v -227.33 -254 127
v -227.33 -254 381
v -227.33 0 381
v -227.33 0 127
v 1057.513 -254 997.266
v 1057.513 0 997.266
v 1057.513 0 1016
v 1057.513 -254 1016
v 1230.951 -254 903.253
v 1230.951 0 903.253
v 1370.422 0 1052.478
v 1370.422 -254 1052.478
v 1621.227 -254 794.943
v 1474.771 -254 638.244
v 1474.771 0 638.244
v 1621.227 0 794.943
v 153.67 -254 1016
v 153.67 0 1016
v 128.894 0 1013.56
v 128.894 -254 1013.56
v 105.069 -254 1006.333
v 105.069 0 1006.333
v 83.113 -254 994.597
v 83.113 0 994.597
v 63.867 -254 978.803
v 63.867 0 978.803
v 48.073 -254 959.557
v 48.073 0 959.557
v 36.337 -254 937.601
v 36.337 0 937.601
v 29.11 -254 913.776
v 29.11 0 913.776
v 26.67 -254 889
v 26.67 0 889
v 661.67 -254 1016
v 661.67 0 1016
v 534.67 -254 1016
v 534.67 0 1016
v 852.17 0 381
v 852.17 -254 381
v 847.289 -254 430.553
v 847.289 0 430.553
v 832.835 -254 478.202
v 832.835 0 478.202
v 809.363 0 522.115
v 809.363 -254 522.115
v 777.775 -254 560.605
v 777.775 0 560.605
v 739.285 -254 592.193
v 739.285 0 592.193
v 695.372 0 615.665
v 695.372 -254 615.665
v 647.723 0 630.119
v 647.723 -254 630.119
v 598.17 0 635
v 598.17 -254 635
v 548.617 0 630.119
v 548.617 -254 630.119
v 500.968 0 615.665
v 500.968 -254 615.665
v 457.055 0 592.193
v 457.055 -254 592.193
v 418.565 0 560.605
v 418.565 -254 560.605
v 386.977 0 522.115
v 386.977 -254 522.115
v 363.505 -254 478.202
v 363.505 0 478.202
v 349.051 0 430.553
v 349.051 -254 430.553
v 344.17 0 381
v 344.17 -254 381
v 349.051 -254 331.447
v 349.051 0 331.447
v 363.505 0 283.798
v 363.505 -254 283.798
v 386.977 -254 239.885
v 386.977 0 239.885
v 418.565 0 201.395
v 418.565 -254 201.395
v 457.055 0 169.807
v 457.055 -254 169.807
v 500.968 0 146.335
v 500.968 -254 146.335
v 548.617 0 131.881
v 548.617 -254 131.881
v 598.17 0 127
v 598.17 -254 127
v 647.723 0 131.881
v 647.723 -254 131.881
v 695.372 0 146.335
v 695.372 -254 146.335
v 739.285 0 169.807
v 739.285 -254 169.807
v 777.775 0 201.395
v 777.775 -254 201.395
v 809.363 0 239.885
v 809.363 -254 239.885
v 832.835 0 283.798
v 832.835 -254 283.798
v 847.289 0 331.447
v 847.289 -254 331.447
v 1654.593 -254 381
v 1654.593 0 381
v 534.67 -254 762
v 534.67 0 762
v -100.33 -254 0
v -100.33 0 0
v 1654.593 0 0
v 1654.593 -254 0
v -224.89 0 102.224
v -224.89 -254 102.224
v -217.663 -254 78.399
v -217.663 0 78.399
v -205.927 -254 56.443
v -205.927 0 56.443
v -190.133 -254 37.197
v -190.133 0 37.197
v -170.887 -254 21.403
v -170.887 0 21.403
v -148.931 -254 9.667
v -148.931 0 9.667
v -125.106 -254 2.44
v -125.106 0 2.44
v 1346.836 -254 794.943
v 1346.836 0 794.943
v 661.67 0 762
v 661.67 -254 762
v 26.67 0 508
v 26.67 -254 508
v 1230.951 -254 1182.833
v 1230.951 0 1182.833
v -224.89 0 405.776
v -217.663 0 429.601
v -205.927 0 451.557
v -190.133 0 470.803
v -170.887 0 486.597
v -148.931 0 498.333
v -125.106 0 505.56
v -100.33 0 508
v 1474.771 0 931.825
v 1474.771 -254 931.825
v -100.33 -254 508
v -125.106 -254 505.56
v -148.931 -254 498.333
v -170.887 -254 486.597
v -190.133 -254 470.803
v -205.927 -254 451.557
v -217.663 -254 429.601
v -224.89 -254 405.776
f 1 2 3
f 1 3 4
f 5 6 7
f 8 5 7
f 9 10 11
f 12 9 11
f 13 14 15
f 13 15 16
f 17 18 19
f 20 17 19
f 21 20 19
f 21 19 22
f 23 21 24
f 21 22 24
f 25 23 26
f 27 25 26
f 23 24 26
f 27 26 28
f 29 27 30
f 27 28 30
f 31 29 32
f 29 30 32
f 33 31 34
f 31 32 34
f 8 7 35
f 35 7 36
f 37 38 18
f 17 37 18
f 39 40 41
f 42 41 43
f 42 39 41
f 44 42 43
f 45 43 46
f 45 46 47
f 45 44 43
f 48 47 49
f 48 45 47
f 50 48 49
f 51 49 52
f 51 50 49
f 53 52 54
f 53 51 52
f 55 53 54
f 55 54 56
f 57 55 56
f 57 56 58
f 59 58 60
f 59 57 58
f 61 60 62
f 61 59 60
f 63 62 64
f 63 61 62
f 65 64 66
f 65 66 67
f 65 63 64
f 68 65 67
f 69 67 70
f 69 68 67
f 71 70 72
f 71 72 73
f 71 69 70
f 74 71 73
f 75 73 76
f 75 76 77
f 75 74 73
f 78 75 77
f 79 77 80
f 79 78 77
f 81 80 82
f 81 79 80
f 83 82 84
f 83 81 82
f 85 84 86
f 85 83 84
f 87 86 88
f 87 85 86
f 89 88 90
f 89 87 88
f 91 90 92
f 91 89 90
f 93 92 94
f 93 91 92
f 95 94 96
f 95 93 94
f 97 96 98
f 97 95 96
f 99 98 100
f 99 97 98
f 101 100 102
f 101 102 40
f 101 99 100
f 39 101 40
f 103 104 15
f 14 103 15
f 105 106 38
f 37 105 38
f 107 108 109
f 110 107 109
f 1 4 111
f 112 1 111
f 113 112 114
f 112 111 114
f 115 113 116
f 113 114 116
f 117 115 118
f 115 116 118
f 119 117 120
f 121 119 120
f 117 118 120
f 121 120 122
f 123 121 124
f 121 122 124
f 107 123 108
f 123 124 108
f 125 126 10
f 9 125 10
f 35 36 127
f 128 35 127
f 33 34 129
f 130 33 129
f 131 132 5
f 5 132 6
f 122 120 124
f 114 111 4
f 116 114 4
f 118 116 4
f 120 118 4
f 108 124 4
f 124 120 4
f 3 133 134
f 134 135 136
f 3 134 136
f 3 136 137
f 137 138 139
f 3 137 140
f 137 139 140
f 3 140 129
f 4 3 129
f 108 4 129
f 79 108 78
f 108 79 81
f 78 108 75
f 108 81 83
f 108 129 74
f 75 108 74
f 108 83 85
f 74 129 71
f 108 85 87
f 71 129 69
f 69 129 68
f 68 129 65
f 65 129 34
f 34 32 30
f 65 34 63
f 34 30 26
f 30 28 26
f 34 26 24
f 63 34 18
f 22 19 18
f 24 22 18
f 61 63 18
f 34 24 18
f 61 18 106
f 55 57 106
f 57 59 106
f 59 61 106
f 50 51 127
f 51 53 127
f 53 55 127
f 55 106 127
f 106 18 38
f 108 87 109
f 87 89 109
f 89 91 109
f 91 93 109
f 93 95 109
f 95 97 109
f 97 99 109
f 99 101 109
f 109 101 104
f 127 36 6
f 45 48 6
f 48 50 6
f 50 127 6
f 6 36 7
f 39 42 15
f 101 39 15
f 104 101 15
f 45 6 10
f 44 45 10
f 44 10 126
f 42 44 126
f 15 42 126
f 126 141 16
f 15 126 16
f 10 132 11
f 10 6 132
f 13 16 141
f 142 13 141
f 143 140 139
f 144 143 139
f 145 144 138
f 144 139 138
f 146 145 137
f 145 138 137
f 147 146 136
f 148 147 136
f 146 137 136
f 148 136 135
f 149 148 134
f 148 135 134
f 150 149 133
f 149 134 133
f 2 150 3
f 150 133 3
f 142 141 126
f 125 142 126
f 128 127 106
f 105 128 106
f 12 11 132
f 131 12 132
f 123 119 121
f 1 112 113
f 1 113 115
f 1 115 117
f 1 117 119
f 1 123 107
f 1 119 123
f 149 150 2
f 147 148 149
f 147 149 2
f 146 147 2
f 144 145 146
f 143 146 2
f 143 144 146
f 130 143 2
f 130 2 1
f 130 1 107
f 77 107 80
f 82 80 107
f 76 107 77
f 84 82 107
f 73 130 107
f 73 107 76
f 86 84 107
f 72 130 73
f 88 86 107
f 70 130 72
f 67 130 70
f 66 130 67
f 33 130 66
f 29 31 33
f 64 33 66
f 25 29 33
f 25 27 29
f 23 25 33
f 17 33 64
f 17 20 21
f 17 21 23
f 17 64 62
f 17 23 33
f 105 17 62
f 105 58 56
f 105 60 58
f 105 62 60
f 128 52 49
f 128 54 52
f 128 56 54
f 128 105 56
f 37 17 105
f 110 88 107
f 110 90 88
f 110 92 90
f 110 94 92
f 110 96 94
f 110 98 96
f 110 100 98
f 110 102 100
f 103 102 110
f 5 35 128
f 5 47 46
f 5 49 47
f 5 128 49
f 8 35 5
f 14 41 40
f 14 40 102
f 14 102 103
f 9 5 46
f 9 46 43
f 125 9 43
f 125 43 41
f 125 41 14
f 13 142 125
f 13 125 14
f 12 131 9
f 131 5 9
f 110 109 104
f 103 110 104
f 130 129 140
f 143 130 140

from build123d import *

# Parameters (mm, degrees)
F0_R     = 254
F1_DEPTH = 254


with BuildPart() as f1:
    # F0 (on Front) → F1 (new body)
    with BuildSketch(Plane.XZ):
        with BuildLine():
            ThreePointArc((-227.329998, 127), (-190.13256, 37.197439), (-100.329998, 0))
            Line((-100.329998, 0), (1550.670002, 0))
            Line((1550.670002, 0), (1654.592514, 0))
            Line((1654.592514, 0), (1654.592514, 381))
            Line((1654.592514, 381), (1474.771318, 638.244218))
            Line((1474.771318, 638.244218), (1621.227109, 794.942517))
            Line((1621.227109, 794.942517), (1474.771318, 931.825298))
            Line((1474.771318, 931.825298), (1346.835812, 794.942517))
            Line((1346.835812, 794.942517), (1230.950807, 903.252757))
            Line((1230.950807, 903.252757), (1370.422253, 1052.478254))
            Line((1370.422253, 1052.478254), (1230.950807, 1182.833217))
            Line((1230.950807, 1182.833217), (1057.512871, 997.265756))
            Line((1057.512871, 997.265756), (1057.512871, 1016))
            Line((1057.512871, 1016), (803.512871, 1016))
            Line((803.512871, 1016), (661.670002, 1016))
            Line((661.670002, 1016), (661.670002, 762))
            Line((661.670002, 762), (534.670002, 762))
            Line((534.670002, 762), (534.670002, 1016))
            Line((534.670002, 1016), (153.670002, 1016))
            ThreePointArc((153.670002, 1016), (63.86744, 978.802561), (26.670002, 889))
            Line((26.670002, 889), (26.670002, 508))
            Line((26.670002, 508), (-100.329998, 508))
            ThreePointArc((-100.329998, 508), (-190.13256, 470.802561), (-227.329998, 381))
            Line((-227.329998, 381), (-227.329998, 127))
        make_face()
        with Locations((598.170002, 381)):
            Circle(F0_R, mode=Mode.SUBTRACT)
    extrude(amount=F1_DEPTH)


solid = f1.part
